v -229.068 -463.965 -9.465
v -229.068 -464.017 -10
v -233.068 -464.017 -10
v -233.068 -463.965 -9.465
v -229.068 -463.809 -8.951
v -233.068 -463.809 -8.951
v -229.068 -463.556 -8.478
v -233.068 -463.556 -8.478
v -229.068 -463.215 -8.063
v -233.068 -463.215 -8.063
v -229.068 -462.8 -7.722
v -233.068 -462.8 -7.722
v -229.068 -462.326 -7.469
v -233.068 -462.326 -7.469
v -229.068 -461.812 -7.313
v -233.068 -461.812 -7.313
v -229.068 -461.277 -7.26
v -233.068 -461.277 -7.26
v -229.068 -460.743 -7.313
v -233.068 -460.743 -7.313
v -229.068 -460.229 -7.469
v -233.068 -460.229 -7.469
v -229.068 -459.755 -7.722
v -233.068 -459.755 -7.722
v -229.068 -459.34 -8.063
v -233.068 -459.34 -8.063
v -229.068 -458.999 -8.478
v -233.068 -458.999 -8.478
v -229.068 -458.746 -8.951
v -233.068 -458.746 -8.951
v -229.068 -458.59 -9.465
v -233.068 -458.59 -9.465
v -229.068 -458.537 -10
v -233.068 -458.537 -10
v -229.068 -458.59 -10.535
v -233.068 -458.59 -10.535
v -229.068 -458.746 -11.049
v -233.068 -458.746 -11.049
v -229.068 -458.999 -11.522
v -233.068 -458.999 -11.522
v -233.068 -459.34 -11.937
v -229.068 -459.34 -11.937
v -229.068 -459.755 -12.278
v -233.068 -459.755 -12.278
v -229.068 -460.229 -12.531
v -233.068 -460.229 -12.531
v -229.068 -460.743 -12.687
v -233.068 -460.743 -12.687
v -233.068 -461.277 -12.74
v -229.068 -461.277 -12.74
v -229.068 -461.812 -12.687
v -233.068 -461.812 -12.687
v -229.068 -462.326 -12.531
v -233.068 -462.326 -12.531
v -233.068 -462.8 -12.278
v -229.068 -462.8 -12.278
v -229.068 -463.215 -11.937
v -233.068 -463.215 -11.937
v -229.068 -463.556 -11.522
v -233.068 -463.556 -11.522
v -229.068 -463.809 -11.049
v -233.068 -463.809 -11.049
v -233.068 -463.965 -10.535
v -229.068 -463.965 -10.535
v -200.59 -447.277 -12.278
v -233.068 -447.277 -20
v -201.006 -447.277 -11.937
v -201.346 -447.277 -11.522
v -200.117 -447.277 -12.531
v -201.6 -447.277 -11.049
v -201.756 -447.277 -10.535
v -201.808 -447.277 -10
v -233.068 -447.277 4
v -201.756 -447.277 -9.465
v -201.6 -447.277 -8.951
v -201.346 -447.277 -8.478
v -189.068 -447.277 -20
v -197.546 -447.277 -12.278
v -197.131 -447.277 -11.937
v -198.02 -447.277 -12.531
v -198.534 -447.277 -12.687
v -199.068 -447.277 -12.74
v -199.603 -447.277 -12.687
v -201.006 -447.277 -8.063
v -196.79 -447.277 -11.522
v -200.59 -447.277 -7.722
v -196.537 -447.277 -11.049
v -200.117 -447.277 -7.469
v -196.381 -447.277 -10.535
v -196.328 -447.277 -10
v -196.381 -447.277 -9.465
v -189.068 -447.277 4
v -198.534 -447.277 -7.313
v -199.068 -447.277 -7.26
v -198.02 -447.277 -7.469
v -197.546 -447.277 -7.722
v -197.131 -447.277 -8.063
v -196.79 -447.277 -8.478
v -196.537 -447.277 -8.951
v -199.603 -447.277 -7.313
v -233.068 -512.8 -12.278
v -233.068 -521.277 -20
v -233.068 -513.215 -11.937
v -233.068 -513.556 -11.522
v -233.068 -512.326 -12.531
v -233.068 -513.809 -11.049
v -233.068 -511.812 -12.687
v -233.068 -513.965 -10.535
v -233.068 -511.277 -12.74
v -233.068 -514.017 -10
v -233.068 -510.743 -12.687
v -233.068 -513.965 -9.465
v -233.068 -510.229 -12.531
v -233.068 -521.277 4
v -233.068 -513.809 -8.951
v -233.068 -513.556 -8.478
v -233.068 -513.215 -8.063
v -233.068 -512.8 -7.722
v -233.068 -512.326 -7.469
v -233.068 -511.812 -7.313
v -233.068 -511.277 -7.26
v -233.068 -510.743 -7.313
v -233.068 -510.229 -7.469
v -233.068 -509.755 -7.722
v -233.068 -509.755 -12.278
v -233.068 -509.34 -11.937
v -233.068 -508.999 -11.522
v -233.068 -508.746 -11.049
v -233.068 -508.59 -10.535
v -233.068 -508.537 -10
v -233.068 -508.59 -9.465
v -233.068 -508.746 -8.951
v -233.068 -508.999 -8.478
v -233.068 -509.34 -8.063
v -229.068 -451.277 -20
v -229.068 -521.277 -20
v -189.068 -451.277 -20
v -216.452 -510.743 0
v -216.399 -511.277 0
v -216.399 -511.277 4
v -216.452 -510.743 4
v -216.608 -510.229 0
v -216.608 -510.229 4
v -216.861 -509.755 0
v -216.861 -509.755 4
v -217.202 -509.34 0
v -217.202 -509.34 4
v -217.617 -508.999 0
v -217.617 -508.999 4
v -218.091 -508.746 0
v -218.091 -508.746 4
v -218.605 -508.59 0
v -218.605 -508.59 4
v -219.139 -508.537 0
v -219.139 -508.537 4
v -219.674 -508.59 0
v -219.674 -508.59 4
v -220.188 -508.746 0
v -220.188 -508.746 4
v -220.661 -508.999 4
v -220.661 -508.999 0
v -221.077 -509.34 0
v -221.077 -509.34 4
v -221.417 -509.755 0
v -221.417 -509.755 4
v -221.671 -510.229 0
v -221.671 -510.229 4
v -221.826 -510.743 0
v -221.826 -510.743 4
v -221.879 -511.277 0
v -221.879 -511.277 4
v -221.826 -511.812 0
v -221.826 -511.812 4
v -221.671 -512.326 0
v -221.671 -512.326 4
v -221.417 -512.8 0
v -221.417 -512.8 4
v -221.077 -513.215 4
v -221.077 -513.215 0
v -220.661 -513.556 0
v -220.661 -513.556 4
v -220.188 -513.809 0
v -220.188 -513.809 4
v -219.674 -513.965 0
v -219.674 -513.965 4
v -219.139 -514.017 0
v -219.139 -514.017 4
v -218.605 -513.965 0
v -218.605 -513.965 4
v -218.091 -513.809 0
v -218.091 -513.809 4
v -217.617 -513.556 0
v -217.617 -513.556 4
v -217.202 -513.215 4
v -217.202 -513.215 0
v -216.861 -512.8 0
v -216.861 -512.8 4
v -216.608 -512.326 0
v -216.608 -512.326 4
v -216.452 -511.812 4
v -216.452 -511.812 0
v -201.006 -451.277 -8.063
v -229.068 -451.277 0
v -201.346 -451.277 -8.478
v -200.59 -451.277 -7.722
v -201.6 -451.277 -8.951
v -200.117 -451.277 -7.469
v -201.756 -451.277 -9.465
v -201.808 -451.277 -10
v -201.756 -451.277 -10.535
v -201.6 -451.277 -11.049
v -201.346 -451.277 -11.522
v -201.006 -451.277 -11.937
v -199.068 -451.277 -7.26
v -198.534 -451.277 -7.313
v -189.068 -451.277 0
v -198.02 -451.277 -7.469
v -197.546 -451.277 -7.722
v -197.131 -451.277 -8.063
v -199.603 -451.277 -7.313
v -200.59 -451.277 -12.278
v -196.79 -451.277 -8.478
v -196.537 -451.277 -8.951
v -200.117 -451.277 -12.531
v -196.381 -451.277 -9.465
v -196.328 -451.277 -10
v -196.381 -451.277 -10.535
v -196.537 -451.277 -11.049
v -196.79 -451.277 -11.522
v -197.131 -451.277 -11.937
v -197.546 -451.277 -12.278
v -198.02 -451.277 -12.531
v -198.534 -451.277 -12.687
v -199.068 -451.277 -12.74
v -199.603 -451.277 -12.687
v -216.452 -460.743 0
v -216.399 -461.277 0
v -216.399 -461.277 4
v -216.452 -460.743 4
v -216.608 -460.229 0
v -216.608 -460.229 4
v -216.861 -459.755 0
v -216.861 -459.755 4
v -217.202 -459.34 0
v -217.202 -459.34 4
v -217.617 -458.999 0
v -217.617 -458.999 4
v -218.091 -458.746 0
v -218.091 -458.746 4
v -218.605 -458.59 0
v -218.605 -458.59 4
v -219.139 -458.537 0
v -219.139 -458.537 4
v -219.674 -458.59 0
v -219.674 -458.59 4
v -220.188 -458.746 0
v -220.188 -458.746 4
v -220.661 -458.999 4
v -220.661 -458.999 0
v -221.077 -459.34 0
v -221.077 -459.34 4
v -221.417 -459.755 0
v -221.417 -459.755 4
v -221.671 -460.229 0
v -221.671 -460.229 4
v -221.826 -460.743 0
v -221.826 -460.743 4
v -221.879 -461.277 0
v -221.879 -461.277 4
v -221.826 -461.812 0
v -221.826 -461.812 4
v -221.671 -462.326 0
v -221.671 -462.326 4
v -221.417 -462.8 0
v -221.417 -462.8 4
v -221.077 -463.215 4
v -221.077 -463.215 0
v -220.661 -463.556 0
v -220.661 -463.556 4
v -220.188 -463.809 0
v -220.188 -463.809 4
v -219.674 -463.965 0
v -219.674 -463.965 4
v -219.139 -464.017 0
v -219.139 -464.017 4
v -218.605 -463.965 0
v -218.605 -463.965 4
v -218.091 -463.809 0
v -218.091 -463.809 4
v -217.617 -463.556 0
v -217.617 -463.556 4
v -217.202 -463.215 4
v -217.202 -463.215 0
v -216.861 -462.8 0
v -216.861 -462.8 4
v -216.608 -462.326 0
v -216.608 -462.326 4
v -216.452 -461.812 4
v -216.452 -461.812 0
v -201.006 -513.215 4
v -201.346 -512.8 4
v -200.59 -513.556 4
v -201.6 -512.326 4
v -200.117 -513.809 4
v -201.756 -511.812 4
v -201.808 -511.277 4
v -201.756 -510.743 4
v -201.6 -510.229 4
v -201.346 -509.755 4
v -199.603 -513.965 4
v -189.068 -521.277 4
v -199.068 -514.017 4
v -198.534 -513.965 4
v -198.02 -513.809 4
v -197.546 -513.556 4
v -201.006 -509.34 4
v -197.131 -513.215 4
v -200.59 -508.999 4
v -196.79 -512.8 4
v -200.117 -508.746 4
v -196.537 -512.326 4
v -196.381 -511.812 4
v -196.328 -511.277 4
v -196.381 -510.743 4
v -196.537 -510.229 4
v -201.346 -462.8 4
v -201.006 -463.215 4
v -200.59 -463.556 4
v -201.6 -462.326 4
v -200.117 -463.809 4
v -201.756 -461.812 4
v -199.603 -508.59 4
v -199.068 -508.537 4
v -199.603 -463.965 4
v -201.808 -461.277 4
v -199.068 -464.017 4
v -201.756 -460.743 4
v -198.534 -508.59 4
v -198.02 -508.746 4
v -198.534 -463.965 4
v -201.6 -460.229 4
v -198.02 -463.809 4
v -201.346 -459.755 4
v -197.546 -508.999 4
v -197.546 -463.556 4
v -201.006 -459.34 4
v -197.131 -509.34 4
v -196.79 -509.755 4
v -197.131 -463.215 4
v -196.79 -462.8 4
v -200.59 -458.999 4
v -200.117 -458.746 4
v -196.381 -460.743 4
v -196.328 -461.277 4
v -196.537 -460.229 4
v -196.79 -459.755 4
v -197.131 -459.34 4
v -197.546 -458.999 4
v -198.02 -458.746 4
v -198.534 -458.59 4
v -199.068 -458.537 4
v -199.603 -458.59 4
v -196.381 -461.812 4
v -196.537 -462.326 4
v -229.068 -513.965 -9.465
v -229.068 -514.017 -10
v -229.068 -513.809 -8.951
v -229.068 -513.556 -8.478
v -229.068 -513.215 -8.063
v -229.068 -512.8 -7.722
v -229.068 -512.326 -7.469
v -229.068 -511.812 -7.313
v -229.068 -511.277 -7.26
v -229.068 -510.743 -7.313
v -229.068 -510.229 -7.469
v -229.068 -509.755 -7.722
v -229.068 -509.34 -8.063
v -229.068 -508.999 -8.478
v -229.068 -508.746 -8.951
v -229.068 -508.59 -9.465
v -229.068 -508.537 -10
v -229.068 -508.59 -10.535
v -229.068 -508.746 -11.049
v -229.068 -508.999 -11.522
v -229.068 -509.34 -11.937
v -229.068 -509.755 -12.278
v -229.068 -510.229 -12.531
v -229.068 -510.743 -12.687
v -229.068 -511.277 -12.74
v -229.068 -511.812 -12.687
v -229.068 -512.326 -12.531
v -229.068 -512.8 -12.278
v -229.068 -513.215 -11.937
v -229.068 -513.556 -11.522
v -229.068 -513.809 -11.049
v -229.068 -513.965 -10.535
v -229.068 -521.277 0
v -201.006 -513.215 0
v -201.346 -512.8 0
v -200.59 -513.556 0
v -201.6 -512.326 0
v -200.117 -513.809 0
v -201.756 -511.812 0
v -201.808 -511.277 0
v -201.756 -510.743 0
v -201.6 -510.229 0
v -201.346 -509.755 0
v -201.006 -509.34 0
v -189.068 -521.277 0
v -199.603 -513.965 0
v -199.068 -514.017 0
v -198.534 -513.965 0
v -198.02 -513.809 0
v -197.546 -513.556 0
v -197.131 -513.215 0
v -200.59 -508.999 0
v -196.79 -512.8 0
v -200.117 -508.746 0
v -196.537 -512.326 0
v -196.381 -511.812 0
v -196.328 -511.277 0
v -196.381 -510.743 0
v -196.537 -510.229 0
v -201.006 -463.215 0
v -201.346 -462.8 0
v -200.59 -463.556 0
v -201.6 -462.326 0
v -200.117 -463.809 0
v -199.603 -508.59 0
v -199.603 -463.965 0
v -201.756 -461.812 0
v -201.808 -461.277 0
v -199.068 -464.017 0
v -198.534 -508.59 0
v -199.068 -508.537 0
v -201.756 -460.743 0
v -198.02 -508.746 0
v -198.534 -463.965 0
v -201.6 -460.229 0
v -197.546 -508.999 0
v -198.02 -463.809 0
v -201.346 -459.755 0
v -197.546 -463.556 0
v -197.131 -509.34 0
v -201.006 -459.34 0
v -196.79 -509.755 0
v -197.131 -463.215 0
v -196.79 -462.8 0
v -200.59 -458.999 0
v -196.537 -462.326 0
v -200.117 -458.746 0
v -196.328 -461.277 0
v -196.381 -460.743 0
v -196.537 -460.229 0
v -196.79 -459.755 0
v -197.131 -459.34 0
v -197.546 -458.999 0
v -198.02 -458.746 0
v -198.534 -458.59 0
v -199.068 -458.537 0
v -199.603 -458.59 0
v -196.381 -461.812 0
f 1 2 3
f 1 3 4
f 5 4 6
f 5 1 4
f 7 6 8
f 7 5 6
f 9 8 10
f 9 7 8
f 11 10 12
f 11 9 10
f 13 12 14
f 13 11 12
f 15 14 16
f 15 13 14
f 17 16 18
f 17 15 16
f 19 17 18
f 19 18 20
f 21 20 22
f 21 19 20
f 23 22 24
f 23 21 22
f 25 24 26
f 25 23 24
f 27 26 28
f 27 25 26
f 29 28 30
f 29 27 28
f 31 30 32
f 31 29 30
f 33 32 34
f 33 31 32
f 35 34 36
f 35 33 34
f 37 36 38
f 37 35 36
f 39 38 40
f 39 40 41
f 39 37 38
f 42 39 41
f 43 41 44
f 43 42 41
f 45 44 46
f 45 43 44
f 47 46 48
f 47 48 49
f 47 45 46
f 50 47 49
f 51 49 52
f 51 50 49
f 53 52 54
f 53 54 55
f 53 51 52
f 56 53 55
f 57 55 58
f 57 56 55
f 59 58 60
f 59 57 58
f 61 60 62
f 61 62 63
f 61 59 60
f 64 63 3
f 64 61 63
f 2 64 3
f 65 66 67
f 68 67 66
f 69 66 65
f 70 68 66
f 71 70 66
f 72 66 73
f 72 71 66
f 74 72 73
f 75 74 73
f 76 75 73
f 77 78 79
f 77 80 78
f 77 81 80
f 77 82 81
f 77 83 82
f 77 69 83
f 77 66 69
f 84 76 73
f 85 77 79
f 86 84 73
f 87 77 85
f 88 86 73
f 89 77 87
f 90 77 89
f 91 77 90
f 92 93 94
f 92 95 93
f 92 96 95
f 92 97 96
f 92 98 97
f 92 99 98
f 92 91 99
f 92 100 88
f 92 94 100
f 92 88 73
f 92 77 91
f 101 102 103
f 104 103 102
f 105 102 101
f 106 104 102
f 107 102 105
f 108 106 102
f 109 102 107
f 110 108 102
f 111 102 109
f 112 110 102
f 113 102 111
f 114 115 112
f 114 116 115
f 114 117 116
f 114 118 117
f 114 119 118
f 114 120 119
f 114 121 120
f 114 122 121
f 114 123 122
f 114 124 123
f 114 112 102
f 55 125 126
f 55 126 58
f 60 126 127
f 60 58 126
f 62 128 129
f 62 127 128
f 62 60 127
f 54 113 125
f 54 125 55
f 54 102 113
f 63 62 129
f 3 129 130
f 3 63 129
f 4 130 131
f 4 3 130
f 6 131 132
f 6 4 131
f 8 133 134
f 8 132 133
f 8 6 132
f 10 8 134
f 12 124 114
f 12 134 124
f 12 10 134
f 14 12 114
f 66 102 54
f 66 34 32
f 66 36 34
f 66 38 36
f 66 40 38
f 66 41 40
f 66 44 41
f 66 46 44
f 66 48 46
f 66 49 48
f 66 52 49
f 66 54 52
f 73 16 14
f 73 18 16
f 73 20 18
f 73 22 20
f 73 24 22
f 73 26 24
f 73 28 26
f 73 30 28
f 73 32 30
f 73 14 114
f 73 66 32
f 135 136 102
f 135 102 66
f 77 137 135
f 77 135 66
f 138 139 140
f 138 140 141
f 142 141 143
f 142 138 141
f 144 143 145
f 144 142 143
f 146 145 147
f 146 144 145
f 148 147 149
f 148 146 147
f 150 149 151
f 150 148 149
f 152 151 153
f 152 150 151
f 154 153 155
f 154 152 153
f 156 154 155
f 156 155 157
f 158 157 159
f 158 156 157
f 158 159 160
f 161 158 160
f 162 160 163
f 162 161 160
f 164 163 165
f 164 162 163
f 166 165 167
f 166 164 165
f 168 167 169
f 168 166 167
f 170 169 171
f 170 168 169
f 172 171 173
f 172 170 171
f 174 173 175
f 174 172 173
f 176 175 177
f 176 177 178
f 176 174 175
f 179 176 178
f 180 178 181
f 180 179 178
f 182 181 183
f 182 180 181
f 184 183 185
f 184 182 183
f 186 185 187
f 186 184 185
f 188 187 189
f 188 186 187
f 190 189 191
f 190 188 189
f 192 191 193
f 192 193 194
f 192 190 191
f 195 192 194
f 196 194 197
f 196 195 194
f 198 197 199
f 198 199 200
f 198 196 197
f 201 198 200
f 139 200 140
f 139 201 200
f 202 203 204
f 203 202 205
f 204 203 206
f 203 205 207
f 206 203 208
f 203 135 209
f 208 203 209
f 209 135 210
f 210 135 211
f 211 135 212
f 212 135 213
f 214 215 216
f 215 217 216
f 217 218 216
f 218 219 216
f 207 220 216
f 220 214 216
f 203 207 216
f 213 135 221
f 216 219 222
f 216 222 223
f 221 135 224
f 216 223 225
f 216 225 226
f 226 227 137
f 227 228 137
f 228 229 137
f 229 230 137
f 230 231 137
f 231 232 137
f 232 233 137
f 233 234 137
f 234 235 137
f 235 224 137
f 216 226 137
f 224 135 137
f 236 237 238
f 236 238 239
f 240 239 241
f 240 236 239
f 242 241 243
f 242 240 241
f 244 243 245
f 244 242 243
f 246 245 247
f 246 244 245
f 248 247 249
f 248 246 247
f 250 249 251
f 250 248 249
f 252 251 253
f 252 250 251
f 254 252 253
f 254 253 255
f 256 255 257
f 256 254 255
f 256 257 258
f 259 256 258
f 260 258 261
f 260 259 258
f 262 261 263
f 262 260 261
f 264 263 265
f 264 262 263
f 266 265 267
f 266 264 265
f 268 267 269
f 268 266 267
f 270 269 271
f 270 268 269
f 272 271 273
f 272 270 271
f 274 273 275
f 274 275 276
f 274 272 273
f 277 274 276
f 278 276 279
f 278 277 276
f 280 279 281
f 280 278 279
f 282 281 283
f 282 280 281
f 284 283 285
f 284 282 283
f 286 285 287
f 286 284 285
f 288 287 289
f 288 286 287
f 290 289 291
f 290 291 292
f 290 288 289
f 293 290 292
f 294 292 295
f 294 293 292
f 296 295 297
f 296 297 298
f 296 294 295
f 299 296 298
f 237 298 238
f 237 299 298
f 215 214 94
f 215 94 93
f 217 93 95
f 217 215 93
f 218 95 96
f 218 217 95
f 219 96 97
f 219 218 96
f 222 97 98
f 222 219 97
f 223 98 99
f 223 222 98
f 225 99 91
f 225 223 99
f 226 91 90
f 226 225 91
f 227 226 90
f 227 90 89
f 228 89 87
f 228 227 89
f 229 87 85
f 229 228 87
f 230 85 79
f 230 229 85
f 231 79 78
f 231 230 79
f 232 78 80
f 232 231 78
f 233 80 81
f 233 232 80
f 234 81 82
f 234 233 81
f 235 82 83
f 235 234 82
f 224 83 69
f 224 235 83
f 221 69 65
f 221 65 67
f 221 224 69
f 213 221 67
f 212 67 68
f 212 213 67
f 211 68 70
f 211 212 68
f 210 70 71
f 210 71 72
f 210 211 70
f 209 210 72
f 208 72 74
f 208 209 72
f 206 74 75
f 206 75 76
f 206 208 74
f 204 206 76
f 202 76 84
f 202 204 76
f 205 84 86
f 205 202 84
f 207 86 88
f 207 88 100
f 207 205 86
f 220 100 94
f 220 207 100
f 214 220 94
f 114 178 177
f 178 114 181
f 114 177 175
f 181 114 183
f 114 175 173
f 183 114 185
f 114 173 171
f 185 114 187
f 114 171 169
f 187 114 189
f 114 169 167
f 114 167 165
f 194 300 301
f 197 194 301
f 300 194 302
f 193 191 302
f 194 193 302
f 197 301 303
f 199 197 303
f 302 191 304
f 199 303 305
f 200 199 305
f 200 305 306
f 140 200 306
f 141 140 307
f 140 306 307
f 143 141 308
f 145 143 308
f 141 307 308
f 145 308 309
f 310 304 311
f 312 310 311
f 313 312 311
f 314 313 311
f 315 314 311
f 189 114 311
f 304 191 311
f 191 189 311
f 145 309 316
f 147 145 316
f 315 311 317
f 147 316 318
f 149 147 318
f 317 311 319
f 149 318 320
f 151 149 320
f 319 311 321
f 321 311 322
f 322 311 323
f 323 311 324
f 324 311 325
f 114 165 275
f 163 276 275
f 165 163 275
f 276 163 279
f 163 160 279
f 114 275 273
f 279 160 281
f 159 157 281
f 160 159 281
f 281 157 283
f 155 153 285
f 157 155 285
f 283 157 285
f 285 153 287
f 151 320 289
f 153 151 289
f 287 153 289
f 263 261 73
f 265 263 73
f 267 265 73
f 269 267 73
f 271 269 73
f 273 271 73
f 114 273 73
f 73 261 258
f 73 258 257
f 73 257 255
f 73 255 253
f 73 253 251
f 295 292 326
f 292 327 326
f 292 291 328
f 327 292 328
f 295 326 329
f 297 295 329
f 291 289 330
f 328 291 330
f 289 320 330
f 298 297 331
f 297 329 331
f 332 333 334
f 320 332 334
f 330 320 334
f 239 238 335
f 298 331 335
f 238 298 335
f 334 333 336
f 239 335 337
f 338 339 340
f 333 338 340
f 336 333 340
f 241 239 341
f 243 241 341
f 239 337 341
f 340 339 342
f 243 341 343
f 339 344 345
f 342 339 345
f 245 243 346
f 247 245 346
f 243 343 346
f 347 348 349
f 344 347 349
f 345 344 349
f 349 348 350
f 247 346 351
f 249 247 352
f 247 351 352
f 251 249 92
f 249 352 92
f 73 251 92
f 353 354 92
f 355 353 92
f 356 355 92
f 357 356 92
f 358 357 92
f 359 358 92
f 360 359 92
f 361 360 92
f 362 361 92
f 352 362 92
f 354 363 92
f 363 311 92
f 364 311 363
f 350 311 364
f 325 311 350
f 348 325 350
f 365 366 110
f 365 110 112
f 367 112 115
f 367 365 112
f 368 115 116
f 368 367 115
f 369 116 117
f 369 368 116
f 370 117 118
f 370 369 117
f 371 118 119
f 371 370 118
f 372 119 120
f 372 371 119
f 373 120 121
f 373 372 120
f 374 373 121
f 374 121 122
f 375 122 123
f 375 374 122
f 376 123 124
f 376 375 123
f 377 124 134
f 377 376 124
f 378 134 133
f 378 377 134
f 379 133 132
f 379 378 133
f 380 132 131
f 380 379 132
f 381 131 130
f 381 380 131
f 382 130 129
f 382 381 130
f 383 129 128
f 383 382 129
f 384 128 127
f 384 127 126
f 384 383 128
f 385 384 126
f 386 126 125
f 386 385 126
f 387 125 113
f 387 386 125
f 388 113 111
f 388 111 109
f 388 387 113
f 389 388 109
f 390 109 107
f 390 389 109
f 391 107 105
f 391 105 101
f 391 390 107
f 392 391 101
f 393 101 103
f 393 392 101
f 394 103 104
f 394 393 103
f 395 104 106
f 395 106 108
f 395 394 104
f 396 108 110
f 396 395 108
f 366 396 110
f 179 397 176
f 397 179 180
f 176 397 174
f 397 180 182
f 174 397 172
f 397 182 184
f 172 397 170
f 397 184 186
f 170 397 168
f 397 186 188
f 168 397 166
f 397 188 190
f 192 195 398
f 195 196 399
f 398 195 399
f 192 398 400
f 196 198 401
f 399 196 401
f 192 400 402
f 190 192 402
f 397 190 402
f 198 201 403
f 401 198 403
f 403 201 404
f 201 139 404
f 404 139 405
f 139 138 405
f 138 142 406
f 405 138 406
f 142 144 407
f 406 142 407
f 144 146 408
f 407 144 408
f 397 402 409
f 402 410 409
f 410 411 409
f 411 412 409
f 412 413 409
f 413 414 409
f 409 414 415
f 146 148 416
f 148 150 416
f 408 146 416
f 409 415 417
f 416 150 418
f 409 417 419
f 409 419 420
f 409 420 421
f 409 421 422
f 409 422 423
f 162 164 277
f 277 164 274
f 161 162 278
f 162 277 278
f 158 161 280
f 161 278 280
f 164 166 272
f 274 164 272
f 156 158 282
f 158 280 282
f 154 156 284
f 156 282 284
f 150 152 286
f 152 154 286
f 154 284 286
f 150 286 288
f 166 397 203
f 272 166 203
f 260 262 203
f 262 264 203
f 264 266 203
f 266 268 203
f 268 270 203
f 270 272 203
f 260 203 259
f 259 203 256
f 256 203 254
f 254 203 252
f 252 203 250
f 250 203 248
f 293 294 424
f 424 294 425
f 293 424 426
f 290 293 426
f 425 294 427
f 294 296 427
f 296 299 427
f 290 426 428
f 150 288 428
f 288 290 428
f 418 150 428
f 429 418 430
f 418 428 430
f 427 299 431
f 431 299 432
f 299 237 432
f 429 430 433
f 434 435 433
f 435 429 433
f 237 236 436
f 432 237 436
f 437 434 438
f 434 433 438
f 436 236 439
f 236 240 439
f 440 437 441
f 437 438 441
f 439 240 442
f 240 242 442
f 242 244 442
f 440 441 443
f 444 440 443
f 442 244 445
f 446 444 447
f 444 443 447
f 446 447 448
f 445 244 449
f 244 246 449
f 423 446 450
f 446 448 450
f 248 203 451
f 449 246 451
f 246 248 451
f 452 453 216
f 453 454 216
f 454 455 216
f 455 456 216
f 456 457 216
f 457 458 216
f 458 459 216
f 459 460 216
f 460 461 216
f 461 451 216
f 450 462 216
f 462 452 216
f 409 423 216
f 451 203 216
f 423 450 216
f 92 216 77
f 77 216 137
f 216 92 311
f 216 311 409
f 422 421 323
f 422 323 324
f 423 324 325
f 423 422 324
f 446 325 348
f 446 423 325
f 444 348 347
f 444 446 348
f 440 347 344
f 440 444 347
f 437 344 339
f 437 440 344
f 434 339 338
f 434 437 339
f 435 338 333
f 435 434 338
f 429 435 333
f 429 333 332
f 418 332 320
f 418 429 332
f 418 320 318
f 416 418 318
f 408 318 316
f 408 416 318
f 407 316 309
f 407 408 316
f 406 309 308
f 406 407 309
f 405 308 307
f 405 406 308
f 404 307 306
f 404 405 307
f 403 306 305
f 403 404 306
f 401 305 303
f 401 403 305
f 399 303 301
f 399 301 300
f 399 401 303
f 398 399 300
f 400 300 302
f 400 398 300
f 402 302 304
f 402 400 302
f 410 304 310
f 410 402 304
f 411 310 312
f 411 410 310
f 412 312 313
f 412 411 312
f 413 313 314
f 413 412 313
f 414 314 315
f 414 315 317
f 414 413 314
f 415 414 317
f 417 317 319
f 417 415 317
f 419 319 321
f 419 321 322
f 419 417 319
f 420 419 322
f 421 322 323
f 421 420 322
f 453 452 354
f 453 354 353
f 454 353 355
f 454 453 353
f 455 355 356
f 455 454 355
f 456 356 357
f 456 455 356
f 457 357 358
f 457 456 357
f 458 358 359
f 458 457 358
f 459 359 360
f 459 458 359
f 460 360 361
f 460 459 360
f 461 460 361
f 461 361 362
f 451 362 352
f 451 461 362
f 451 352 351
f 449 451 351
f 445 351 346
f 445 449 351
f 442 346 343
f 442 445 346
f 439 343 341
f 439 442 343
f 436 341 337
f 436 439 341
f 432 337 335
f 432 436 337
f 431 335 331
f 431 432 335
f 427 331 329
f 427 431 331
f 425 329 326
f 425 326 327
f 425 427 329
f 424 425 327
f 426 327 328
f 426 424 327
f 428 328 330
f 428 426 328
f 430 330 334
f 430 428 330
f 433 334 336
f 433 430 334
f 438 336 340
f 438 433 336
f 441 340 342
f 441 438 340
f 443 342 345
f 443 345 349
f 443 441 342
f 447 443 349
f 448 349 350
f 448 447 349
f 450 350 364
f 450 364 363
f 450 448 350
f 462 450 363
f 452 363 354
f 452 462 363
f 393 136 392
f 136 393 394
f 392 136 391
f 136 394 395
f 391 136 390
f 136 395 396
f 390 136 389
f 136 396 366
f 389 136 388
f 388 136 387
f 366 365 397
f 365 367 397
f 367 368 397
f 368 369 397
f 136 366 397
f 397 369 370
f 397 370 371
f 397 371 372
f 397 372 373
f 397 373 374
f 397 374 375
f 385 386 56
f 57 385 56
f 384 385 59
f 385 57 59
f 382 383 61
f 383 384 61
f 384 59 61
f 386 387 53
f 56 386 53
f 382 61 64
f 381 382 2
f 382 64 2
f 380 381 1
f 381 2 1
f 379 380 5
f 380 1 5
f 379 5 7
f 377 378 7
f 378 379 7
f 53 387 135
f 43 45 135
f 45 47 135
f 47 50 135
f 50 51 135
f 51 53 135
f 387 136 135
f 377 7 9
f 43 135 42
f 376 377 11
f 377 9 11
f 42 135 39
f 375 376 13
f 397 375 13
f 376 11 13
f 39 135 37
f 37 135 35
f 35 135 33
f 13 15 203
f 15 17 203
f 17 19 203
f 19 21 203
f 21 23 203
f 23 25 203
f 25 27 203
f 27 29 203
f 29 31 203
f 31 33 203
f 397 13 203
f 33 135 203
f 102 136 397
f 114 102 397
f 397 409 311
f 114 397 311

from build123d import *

# Parameters (mm, degrees)
SKETCH1_W           = 40
SKETCH1_H           = 70
SKETCH1_R           = 2.74
BOSS_EXTRUDE1_DEPTH = 4
SKETCH2_W           = 40
SKETCH2_H           = 24
SKETCH2_R           = 2.74
BOSS_EXTRUDE2_DEPTH = 4
SKETCH3_W           = 24
SKETCH3_H           = 74
SKETCH3_R           = 2.74
BOSS_EXTRUDE3_DEPTH = 4


with BuildPart() as part:
    # Sketch1 → Boss-Extrude1 (new body)
    with BuildSketch(Plane.XY):
        with Locations((-209.068179547, -486.277483232)):
            Rectangle(SKETCH1_W, SKETCH1_H)
        with Locations((-199.068179547, -461.277483232)):
            Circle(SKETCH1_R, mode=Mode.SUBTRACT)
        with Locations((-219.139101533, -461.277483232)):
            Circle(SKETCH1_R, mode=Mode.SUBTRACT)
        with Locations((-219.139101533, -511.277483232)):
            Circle(SKETCH1_R, mode=Mode.SUBTRACT)
        with Locations((-199.068179547, -511.277483232)):
            Circle(SKETCH1_R, mode=Mode.SUBTRACT)
    extrude(amount=BOSS_EXTRUDE1_DEPTH)

    # Sketch2 → Boss-Extrude2 (add)
    with BuildSketch(Plane(origin=(0, -451.277483232, 0), x_dir=(1, 0, 0), z_dir=(0, 1, 0))):
        with Locations((-209.068179547, 8)):
            Rectangle(SKETCH2_W, SKETCH2_H)
        with Locations(Location((-199.068179547, 10, 0), (0, 0, 270))):
            Circle(SKETCH2_R, mode=Mode.SUBTRACT)
    extrude(amount=BOSS_EXTRUDE2_DEPTH)

    # Sketch3 → Boss-Extrude3 (add)
    with BuildSketch(Plane.ZY.offset(229.068179547)):
        with Locations((-8, -484.277483232)):
            Rectangle(SKETCH3_W, SKETCH3_H)
        with Locations(Location((-10, -461.277483232, 0), (0, 0, 270))):
            Circle(SKETCH3_R, mode=Mode.SUBTRACT)
        with Locations(Location((-10, -511.277483232, 0), (0, 0, 270))):
            Circle(SKETCH3_R, mode=Mode.SUBTRACT)
    extrude(amount=BOSS_EXTRUDE3_DEPTH)


solid = part.part
